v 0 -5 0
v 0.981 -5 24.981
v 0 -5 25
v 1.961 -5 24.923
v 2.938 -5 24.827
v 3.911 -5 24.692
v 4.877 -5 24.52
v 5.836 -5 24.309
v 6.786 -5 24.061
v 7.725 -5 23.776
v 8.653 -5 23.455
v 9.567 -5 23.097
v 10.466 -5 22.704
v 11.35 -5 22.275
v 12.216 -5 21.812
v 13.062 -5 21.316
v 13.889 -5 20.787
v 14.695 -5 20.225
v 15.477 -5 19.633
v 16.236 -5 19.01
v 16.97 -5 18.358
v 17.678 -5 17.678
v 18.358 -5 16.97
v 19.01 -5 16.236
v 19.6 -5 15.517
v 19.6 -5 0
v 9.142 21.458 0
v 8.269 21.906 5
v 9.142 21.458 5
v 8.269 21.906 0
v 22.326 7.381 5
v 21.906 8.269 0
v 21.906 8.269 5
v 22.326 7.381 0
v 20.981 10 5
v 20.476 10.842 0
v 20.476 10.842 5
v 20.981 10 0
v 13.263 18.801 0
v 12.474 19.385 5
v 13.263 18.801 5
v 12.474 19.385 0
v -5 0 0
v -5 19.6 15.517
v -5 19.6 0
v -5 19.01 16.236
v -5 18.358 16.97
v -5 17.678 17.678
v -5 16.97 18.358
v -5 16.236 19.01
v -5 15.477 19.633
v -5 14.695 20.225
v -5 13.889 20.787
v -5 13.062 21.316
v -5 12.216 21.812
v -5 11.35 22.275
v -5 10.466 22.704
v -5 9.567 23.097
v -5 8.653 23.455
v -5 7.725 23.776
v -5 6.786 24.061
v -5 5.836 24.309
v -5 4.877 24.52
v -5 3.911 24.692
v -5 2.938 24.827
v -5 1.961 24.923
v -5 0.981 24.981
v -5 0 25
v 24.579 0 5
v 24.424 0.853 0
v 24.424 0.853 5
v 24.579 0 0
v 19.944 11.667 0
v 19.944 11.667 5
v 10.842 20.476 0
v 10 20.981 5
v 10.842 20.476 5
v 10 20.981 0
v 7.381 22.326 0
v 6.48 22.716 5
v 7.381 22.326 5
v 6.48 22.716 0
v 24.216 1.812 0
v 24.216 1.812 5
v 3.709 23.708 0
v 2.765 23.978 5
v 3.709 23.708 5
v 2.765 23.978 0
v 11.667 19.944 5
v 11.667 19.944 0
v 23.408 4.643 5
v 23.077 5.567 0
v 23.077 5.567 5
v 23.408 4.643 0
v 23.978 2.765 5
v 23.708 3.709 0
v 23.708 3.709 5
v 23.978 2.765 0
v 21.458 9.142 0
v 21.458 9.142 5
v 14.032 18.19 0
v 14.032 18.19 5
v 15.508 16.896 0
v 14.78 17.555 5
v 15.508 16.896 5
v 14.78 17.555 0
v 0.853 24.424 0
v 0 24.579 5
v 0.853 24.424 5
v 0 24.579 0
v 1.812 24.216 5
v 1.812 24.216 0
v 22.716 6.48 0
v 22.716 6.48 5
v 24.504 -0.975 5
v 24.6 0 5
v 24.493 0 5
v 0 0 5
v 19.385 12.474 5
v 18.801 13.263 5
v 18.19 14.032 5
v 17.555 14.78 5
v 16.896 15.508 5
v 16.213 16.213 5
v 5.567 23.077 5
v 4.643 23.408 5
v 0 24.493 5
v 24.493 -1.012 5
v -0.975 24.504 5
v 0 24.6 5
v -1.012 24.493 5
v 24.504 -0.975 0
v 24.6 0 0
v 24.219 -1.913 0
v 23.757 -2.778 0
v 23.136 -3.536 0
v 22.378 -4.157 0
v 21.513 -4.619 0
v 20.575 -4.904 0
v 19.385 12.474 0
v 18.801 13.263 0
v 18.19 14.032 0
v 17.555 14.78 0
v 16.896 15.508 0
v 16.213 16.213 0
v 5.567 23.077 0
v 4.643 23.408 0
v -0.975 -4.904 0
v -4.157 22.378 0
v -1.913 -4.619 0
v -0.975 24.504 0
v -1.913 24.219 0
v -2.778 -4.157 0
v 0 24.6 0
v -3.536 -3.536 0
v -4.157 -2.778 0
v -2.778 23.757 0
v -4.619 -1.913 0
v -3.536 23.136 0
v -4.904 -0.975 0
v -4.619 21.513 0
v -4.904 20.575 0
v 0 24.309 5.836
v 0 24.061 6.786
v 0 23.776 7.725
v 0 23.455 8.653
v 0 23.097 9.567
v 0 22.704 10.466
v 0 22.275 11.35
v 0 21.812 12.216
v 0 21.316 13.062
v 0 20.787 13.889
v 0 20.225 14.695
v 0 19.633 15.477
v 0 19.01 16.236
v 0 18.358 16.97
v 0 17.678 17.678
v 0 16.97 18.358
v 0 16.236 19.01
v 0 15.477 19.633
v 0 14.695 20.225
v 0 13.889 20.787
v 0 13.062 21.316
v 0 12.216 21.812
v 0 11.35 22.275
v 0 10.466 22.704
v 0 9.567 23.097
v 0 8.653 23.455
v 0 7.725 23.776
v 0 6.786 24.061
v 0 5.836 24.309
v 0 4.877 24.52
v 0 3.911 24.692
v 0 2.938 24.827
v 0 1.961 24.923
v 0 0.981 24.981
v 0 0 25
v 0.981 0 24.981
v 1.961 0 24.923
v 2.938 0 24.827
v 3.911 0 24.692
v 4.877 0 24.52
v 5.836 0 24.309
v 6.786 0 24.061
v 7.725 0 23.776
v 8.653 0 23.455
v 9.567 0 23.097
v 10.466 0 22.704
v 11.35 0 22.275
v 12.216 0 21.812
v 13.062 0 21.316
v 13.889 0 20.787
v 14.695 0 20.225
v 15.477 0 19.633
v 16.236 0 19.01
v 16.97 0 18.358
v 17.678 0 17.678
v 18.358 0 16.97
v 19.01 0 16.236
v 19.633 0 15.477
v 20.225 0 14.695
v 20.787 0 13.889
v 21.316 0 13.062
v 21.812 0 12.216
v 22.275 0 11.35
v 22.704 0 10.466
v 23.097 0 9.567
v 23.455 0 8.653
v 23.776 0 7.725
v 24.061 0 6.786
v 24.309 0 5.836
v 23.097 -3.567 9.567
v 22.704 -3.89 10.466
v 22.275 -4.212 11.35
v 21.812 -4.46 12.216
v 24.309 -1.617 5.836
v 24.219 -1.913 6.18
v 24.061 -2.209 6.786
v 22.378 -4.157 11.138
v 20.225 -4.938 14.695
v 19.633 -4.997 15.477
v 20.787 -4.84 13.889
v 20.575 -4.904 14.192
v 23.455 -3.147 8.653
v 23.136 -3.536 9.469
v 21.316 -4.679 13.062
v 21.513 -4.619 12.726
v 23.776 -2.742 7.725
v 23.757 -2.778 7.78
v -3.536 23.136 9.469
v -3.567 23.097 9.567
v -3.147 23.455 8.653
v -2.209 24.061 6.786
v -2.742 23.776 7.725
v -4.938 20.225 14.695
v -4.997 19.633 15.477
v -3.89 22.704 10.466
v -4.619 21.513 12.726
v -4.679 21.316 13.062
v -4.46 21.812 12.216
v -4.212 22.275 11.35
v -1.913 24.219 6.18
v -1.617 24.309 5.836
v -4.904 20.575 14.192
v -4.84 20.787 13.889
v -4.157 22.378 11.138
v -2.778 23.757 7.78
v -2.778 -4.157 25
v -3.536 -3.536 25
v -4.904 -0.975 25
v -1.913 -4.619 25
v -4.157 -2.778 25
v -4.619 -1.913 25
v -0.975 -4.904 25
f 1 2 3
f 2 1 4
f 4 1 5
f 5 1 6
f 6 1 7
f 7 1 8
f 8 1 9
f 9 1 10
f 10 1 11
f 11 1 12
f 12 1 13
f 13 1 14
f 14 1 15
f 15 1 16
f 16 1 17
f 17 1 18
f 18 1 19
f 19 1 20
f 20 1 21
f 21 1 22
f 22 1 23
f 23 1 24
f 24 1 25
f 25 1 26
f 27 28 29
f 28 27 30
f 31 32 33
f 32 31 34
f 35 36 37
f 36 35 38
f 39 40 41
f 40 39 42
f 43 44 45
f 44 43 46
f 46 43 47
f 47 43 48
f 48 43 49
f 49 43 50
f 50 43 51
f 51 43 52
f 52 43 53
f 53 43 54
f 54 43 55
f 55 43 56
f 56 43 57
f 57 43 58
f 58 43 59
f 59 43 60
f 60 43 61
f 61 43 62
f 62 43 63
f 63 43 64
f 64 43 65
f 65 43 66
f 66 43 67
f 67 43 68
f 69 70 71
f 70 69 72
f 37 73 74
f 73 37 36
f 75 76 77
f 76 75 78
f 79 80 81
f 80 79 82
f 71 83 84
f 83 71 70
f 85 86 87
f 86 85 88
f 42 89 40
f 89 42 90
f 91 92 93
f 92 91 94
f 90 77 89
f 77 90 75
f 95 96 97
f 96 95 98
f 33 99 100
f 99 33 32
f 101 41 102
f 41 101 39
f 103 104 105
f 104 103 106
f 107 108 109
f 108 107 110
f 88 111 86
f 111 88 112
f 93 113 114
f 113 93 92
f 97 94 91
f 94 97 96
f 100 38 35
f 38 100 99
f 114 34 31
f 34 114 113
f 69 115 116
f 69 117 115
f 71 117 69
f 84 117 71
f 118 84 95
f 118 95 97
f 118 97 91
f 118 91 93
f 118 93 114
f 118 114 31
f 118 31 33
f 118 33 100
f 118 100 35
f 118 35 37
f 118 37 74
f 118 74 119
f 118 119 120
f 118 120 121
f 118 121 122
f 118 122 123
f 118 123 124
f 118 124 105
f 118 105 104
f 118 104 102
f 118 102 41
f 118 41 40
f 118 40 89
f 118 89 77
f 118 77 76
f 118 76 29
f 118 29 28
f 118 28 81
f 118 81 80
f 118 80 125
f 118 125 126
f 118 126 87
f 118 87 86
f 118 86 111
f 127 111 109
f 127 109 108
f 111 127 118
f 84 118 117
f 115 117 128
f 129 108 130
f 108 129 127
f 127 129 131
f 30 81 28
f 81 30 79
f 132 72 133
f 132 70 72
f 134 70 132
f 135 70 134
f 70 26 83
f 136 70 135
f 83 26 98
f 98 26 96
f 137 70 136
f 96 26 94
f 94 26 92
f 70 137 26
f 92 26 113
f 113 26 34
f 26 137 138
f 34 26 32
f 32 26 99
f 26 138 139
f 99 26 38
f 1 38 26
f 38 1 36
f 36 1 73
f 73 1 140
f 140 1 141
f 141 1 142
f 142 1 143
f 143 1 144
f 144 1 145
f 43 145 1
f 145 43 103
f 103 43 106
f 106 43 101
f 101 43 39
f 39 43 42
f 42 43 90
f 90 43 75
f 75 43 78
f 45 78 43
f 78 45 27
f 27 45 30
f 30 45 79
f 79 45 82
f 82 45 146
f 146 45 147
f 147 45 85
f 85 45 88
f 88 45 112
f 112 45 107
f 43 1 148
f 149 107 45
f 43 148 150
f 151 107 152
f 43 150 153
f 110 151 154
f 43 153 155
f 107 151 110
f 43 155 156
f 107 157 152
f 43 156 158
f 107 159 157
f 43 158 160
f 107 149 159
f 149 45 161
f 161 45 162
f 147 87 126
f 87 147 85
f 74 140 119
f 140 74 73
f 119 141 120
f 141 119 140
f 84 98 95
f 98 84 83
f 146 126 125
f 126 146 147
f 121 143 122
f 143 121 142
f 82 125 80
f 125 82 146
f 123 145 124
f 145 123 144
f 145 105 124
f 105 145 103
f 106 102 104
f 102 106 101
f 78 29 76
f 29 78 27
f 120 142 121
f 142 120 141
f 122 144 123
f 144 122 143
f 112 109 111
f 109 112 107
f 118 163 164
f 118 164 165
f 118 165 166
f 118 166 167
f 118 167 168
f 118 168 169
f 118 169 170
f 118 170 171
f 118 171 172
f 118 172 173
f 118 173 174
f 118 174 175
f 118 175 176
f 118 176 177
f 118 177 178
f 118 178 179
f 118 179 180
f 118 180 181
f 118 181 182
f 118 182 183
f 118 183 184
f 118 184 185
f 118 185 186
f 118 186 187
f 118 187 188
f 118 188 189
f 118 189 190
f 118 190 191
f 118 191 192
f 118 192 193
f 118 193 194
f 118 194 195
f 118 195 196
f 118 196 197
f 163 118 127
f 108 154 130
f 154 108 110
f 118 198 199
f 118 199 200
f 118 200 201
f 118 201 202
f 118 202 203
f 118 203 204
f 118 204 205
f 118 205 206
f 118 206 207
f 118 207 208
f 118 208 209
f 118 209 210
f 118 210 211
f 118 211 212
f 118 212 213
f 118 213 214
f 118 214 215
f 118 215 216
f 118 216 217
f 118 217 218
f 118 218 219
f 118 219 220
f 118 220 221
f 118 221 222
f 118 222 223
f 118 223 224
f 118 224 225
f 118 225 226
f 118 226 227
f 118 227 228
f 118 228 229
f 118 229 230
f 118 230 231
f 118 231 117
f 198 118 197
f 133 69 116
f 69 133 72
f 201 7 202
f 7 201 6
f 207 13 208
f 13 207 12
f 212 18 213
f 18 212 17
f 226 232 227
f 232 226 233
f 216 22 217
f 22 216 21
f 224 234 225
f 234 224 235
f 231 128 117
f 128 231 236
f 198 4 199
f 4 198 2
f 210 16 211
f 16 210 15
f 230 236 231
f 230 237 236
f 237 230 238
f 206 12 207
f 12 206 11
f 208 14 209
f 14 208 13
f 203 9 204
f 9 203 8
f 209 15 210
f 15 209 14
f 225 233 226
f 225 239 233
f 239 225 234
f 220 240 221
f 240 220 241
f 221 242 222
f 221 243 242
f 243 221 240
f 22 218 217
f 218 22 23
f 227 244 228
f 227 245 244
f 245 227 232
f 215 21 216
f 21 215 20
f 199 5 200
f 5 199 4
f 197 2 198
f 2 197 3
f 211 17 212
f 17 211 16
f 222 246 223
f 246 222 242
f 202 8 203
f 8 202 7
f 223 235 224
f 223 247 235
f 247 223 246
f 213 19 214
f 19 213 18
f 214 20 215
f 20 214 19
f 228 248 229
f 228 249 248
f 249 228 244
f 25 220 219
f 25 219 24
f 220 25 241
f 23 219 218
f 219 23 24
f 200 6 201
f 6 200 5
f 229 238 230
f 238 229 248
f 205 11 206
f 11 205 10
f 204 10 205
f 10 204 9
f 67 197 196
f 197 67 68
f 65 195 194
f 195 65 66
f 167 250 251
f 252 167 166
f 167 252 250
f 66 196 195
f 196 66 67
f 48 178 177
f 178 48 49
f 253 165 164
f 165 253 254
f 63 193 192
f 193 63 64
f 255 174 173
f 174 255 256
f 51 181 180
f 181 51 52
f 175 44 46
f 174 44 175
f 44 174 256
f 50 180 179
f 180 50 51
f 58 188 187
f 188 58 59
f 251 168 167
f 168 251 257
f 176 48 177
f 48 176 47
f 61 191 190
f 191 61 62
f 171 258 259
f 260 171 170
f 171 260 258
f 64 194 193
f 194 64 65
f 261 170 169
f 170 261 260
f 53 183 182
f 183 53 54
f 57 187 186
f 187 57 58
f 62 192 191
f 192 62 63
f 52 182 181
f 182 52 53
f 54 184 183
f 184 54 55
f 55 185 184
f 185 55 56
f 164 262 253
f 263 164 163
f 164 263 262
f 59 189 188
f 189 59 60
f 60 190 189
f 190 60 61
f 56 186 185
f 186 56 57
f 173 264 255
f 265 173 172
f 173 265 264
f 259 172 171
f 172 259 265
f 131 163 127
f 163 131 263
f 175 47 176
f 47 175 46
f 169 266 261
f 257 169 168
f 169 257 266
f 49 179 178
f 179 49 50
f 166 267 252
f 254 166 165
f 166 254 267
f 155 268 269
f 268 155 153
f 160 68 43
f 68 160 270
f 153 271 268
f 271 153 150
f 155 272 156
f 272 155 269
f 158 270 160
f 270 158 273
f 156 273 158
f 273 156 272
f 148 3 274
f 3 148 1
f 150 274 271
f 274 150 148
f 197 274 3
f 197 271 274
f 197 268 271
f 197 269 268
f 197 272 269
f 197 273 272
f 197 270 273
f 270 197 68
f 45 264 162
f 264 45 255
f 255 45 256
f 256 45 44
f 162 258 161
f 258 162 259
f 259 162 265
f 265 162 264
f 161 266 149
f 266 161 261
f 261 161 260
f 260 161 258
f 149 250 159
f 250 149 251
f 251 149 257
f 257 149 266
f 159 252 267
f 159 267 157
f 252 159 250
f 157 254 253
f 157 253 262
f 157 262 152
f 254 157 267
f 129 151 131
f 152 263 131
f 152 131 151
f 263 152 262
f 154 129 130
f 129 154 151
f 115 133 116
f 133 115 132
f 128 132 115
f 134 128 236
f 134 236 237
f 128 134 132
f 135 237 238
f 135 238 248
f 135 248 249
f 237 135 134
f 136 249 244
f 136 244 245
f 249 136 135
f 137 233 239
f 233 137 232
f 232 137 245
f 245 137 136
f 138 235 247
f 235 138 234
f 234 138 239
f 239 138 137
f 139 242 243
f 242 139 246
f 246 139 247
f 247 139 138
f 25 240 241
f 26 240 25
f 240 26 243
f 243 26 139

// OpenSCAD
//Size in mm
size      = 25;

//Thickness in mm, thicker guard will work better but would print slower and requires more material
thickness = 5;

//Resolution of the corners in mm. Reduce this value to have smoother corner, increase to have rougher corners.
resolution   = 1;

/* [hidden] */

pi = 3.1416;

module p1(r, h) {
    len=r*pi/2;
    s = ceil(len / resolution);
    steps = s < 6 ? 6 : s;
    ang = 90/steps;
    
    pts = [for(i=[0:ang:90.01]) [cos(i)*r, sin(i)*r]];
    linear_extrude(height=h)
    polygon(concat([[0,0]], pts));
}

module p2(r, h) {
    len=r*pi/2;
    s = ceil(len / resolution);
    steps = s < 6 ? 6 : s;
    ang = 90/steps;
    
    pts = [for(i=[0:ang:90.01]) [cos(i)*r, sin(i)*r]];
    linear_extrude(height=h)
    polygon(concat([[0,r*2], [r*2,r*2], [r*2,0]], pts));
}

r = size;
h = thickness;


difference() {
  union() {
    rotate([0, 0, 0]) 
    translate([-h, -h, 0])
        p1(r+h, h);
      
    translate([0,-h,0])
    cube([r,h,h]);
    translate([-h,0,0])
    cube([h,r,h]);

    rotate([90, 0, 0]) 
        p1(r, h);
    rotate([0, -90, 0]) 
        p1(r, h);

    rotate([0,0,180])
        p1(h, r);
  }
  
  rotate([0,0,180])
        p2(h, r);
  
  rotate([0,0,90])
  translate([r-h-0.4,0,0])
        p2(h, r);
  
  rotate([0,0,-90])
  translate([0,r-h-0.4,0])
        p2(h, r);
  
}
